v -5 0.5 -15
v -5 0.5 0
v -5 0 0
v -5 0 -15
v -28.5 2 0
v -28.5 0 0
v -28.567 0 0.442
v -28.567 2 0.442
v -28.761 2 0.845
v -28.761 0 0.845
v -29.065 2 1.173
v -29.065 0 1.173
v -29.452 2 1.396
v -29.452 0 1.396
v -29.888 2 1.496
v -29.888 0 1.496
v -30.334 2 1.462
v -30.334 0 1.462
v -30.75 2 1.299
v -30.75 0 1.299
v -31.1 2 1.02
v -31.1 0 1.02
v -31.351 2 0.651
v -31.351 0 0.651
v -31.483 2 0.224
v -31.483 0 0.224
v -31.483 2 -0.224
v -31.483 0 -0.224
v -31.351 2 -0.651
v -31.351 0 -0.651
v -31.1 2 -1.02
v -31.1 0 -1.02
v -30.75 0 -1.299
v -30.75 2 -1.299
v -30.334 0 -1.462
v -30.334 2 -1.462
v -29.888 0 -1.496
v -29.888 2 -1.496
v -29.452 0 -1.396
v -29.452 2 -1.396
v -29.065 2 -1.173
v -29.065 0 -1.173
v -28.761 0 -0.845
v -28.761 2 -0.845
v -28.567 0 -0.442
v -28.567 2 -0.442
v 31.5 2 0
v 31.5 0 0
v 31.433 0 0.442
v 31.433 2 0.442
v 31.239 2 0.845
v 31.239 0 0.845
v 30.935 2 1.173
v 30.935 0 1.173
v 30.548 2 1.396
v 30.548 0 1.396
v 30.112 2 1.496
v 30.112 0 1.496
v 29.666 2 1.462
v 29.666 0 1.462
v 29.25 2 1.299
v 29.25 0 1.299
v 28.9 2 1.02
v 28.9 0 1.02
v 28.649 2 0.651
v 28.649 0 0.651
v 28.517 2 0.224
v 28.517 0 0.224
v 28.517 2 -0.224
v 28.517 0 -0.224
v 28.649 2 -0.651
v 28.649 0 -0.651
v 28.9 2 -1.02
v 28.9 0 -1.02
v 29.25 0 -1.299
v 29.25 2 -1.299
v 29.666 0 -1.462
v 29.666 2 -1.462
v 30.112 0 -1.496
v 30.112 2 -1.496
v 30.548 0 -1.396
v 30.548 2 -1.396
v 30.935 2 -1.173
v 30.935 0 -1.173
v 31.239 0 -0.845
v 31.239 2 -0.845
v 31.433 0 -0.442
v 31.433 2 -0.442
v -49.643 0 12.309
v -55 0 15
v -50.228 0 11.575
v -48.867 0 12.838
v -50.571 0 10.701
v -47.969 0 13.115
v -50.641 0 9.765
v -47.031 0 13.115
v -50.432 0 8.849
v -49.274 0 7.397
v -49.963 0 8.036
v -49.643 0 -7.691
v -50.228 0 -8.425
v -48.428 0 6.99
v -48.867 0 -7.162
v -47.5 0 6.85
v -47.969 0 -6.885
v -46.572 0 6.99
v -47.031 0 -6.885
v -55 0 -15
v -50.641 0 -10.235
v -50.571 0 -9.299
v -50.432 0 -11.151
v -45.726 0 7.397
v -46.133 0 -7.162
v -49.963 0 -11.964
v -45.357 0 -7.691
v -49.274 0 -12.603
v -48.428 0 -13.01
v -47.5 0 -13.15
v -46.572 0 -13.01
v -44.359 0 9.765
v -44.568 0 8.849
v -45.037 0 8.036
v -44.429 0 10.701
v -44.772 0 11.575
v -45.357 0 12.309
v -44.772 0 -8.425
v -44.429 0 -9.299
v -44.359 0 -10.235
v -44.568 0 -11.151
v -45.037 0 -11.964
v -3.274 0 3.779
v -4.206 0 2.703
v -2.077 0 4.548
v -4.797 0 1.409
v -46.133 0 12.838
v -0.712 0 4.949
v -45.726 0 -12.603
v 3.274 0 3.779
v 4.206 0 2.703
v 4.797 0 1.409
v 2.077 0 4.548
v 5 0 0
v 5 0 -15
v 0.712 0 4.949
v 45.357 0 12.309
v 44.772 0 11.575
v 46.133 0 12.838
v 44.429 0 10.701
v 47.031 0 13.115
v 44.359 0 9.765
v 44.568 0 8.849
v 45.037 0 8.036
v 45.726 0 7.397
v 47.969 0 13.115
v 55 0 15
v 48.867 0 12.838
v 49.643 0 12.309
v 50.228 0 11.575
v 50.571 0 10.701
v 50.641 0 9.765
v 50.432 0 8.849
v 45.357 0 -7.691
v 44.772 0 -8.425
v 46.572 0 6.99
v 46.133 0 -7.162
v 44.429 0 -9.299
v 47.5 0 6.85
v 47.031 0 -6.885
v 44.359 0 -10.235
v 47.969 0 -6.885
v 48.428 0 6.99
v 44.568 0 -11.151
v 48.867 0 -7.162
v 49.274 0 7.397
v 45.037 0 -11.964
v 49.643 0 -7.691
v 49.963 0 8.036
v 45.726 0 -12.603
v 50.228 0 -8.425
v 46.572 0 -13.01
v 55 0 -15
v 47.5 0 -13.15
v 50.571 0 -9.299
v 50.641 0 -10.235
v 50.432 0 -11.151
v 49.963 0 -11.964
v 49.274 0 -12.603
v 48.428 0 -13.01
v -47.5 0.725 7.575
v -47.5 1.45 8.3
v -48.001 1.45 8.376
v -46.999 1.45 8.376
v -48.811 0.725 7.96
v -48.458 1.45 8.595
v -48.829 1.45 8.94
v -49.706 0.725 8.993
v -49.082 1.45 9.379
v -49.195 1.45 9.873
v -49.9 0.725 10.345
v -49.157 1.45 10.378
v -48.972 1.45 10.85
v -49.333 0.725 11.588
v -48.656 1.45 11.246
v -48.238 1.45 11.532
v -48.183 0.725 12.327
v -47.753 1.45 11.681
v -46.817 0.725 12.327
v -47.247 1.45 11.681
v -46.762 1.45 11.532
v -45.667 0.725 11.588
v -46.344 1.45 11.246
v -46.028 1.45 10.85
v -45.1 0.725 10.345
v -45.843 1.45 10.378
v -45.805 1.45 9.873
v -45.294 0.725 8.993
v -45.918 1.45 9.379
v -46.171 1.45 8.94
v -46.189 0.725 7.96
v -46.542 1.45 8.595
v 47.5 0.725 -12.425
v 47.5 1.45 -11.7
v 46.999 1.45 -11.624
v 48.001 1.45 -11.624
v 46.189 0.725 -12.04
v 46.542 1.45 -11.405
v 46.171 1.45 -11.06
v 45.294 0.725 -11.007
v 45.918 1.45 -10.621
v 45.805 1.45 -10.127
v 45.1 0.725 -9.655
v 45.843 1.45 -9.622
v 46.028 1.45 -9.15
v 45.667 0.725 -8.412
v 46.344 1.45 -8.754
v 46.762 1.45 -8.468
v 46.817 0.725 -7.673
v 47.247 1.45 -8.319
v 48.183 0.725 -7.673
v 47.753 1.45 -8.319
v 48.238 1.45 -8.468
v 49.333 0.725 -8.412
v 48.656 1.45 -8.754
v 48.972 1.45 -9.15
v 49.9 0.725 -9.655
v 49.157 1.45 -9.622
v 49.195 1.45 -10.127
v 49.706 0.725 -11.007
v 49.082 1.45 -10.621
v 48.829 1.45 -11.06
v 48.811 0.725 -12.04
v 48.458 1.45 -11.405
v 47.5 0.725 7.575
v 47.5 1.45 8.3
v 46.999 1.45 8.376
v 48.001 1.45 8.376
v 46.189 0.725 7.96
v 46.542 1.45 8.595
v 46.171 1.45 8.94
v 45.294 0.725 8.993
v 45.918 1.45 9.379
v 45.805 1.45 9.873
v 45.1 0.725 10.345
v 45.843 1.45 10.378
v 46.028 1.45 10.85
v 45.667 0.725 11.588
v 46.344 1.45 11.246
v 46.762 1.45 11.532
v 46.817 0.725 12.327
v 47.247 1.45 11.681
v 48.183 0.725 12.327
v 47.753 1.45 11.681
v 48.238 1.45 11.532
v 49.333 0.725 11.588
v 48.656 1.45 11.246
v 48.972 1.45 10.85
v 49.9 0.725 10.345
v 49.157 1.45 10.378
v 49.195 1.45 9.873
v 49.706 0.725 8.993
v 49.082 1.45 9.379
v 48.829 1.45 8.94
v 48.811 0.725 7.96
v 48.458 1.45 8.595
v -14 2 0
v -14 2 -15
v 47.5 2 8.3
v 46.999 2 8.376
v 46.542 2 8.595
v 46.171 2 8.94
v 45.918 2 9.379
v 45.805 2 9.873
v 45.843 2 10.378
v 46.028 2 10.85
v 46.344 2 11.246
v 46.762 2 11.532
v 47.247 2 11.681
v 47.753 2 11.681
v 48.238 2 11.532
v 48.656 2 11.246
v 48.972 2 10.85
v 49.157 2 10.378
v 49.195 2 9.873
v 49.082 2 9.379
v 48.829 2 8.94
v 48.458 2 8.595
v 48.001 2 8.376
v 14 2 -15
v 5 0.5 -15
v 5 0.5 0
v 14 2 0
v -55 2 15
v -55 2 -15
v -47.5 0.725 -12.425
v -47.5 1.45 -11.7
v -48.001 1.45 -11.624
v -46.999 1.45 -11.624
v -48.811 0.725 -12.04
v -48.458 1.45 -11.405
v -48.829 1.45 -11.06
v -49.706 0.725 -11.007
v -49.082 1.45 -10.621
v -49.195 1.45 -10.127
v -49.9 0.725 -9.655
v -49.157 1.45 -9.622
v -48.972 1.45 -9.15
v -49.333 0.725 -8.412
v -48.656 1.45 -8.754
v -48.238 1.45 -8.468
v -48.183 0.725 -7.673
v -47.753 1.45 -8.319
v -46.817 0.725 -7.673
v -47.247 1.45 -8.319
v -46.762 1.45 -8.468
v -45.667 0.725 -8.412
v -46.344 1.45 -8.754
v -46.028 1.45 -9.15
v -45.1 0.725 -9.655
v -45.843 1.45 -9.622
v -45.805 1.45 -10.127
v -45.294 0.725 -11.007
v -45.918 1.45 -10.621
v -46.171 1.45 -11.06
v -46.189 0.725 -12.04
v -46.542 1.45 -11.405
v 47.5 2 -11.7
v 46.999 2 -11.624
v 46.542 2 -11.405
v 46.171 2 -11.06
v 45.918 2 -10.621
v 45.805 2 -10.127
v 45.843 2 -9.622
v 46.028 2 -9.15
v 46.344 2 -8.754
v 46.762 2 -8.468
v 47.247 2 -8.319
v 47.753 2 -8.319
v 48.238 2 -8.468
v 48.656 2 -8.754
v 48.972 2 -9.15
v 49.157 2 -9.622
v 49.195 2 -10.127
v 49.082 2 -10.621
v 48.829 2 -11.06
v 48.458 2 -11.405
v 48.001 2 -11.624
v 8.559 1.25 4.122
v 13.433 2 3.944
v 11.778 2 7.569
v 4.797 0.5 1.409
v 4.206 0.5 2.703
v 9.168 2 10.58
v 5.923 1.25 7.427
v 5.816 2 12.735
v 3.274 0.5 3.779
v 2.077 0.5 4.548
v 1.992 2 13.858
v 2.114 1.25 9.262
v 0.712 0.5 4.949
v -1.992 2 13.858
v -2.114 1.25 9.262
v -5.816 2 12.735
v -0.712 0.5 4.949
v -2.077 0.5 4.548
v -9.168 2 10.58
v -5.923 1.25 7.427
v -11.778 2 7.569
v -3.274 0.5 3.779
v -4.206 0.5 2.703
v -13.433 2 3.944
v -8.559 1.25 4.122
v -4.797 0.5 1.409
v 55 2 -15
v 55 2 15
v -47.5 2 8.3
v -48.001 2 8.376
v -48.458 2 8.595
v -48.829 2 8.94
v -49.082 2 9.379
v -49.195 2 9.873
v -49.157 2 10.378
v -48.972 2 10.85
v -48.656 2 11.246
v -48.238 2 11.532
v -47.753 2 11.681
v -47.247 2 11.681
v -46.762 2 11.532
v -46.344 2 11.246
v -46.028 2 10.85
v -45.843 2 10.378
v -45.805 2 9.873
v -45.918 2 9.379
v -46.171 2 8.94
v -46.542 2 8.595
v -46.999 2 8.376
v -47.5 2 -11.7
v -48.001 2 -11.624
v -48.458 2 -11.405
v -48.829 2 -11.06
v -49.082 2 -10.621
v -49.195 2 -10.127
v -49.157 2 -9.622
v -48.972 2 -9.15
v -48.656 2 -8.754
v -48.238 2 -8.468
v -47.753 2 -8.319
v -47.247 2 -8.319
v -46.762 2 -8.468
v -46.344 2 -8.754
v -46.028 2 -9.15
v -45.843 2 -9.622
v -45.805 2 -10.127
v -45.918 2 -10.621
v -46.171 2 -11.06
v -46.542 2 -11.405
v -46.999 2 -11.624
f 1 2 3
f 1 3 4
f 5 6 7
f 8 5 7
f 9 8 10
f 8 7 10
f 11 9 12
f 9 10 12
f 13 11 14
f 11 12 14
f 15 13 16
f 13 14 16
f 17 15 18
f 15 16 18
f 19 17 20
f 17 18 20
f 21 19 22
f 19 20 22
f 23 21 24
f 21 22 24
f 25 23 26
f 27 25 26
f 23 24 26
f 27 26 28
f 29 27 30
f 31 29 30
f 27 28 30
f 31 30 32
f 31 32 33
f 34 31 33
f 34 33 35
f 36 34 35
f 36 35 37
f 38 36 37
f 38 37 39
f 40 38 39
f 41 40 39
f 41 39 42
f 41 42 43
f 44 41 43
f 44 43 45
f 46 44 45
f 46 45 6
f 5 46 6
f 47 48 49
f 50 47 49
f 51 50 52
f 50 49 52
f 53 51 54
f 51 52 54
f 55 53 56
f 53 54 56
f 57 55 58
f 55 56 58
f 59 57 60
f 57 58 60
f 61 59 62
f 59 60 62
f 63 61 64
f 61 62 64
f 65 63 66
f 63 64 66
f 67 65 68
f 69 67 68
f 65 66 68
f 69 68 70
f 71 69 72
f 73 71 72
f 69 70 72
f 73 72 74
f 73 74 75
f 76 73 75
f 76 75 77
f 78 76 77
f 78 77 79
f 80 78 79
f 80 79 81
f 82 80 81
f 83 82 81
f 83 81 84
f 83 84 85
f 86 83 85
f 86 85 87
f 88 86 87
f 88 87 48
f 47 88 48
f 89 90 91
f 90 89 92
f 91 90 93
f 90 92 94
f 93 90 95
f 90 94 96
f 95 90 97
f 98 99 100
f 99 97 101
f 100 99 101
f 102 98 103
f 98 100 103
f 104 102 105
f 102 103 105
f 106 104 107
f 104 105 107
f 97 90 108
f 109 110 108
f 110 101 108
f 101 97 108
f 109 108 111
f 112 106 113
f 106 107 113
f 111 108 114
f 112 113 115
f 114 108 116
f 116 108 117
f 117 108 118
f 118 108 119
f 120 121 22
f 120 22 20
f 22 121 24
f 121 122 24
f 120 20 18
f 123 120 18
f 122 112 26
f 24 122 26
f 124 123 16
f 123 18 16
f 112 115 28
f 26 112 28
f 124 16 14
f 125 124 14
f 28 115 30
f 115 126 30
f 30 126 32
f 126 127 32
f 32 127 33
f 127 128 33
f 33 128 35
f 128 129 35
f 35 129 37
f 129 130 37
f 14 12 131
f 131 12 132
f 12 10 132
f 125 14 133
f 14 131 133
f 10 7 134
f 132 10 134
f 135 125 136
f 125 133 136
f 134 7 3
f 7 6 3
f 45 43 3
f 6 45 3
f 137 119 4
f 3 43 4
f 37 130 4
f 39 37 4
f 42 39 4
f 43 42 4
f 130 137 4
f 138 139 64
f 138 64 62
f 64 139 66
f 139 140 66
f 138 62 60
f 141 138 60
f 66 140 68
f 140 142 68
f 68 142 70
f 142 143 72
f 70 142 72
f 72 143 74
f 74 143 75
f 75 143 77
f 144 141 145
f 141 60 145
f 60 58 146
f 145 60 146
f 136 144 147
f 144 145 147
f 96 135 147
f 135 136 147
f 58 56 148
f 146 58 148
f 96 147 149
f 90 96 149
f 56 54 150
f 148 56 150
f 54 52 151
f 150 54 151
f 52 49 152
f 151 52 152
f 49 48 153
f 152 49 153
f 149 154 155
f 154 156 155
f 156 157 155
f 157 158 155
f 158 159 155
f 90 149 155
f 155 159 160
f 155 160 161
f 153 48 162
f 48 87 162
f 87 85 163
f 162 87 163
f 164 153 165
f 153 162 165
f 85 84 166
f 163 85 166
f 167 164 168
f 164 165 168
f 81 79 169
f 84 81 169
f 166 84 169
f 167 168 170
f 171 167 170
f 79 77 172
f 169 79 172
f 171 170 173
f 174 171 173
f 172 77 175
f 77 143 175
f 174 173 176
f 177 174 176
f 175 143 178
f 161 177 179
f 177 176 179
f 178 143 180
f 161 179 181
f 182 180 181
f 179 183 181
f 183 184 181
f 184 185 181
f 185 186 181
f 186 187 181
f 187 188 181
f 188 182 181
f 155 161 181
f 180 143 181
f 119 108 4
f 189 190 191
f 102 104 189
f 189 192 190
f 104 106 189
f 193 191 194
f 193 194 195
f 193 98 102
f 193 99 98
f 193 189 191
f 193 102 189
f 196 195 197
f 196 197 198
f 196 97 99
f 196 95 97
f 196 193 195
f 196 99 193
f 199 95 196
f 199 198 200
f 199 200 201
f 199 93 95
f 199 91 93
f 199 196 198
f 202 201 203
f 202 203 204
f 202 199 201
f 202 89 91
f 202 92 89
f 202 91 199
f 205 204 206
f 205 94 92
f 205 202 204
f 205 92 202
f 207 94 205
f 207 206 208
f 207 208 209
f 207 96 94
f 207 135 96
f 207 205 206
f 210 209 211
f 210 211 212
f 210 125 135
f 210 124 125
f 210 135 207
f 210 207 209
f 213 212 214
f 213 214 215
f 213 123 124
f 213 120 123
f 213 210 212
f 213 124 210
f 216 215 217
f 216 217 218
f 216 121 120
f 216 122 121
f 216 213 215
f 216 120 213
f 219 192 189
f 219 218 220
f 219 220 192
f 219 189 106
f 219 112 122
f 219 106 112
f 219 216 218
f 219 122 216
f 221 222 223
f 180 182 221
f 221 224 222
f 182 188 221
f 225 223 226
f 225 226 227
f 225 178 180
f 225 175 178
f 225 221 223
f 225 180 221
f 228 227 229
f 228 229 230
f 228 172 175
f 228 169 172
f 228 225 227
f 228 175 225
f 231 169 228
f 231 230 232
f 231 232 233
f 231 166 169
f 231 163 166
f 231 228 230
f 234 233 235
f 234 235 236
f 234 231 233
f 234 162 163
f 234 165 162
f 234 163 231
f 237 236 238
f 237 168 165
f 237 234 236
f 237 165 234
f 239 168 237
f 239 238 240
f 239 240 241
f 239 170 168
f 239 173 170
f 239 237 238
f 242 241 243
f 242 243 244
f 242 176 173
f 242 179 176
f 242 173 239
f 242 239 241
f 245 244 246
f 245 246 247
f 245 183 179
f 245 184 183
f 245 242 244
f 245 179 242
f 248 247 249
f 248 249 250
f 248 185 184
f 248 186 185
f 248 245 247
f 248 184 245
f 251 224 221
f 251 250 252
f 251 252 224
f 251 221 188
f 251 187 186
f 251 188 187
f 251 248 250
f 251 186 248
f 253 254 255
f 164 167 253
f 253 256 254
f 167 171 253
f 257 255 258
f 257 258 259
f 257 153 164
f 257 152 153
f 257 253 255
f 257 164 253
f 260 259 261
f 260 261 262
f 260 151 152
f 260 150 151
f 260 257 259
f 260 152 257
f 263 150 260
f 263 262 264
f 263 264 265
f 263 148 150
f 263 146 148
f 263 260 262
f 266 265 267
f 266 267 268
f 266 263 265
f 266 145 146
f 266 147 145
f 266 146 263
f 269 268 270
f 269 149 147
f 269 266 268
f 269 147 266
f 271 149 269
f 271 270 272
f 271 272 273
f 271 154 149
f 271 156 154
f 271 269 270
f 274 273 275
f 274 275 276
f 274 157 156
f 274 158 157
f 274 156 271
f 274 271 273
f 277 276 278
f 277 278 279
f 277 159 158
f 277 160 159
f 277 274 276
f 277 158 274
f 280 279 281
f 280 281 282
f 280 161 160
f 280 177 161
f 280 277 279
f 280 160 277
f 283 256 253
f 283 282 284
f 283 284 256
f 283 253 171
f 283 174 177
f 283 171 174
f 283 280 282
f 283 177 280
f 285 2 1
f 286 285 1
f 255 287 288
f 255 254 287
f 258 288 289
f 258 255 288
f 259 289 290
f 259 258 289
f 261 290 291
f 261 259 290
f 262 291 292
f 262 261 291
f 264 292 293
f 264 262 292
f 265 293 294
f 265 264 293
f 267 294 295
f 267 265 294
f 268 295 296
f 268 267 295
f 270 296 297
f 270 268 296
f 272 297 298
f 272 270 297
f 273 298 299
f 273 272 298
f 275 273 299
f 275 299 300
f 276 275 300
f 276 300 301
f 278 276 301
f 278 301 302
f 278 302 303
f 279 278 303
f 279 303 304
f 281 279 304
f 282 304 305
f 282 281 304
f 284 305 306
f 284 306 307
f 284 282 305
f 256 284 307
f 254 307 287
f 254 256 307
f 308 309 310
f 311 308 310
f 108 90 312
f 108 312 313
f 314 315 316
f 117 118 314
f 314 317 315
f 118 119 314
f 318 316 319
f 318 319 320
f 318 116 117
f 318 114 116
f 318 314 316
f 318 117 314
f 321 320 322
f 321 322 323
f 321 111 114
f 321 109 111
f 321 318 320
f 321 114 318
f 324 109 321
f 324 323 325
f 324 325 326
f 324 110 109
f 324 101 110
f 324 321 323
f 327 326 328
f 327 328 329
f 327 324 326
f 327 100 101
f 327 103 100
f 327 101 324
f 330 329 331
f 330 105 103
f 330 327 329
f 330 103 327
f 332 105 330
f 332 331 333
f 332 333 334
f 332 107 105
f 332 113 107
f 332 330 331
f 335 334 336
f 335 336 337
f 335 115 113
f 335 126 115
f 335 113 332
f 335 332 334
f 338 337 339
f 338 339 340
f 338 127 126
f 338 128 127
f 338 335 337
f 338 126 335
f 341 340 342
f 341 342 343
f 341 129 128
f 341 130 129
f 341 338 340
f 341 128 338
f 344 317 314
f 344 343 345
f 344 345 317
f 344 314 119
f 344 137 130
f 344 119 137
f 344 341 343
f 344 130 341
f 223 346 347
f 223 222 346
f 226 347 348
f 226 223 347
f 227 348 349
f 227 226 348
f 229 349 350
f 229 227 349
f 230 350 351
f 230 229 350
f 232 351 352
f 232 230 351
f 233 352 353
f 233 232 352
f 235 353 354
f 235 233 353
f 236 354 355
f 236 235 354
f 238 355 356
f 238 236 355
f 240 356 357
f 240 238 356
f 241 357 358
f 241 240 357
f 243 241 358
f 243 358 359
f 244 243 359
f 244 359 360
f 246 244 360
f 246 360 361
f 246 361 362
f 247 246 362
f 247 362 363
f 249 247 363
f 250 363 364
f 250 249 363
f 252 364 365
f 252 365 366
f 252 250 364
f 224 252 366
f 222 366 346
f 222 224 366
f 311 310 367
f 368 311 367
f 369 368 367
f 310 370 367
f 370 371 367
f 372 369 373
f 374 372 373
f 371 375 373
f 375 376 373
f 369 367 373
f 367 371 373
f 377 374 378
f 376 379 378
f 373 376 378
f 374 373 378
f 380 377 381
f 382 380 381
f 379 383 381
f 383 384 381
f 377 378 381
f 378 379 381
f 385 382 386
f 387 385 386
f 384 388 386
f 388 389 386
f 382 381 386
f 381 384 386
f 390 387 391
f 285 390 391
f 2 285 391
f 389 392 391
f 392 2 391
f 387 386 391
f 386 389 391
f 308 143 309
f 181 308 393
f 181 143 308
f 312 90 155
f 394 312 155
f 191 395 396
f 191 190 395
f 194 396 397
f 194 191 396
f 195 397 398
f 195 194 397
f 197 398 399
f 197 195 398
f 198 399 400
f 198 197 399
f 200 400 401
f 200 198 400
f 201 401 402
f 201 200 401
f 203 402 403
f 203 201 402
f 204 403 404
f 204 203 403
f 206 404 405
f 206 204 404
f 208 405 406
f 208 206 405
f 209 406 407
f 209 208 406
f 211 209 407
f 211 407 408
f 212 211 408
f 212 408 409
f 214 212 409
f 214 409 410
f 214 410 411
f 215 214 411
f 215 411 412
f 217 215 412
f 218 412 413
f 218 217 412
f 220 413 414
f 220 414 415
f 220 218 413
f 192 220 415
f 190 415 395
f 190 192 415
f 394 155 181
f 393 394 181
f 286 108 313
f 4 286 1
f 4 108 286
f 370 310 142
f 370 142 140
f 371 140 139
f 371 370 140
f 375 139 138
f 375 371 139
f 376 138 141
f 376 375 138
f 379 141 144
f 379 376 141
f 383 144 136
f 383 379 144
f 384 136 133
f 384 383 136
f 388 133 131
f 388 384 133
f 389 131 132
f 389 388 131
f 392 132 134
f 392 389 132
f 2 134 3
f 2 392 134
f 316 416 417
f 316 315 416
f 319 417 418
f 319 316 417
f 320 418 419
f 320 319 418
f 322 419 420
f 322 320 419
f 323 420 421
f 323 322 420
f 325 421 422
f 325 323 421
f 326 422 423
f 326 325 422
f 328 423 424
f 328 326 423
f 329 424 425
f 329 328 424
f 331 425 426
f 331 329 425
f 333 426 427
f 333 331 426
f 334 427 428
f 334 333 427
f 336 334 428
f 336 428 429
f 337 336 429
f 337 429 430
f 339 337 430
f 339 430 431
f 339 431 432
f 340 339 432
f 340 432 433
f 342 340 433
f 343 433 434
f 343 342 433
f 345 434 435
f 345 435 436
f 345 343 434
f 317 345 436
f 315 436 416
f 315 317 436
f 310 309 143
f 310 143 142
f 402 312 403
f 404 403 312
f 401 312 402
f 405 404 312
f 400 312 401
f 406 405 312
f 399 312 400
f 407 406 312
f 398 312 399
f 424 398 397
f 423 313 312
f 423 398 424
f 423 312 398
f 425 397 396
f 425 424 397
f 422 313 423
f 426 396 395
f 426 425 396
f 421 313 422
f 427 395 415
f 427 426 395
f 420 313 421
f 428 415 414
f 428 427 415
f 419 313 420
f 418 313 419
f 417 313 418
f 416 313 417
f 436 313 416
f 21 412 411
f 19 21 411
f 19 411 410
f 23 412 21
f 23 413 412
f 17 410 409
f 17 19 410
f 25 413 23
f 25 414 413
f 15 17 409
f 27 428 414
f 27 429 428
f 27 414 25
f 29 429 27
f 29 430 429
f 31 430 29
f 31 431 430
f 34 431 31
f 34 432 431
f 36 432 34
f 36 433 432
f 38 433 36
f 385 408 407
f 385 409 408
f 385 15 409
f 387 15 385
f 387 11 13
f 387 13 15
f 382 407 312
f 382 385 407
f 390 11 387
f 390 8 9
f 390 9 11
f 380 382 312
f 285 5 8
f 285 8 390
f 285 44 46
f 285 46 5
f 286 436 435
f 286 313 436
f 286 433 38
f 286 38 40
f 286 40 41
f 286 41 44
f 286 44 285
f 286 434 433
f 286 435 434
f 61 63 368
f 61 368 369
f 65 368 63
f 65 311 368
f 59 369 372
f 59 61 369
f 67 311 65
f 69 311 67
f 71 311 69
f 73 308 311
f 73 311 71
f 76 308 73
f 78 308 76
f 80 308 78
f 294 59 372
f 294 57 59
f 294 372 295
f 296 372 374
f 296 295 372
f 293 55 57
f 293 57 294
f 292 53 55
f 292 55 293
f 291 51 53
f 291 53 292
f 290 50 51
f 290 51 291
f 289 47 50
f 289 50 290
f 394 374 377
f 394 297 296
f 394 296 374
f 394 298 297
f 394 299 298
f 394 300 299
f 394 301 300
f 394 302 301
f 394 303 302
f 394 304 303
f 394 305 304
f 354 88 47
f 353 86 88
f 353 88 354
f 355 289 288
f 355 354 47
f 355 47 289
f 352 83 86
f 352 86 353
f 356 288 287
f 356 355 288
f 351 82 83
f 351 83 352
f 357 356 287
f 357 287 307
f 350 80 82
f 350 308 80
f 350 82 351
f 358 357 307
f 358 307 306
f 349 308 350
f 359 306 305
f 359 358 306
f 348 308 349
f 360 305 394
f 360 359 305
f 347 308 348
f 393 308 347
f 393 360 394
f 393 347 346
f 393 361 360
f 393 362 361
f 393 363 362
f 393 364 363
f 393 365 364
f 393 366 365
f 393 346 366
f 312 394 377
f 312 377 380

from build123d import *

# Parameters (mm, degrees)
SKETCH1_W                                    = 110
SKETCH1_H                                    = 30
EXTRUDE1_DEPTH                               = 2
CUT_EXTRUDE1_DEPTH                           = 3
CHAMFER1_SIZE                                = 9
CHAMFER1_SIZE2                               = 1.5
CSK_FOR_M3_COUNTERSUNK_RAISED_HEAD_S_2_COUNT = 2
CSK_FOR_M3_COUNTERSUNK_RAISED_HEAD_S_2_PITCH = 95
CSK_FOR_M3_COUNTERSUNK_RAISED_HEAD_S_3_COUNT = 2
CSK_FOR_M3_COUNTERSUNK_RAISED_HEAD_S_3_PITCH = 97.082439195
CSK_FOR_M3_COUNTERSUNK_RAISED_HEAD_S_4_COUNT = 2
CSK_FOR_M3_COUNTERSUNK_RAISED_HEAD_S_4_PITCH = 20
M3_TAPPED_HOLE1_D                            = 3


with BuildPart() as part:
    # Sketch1 → Extrude1 (new body)
    with BuildSketch(Plane(origin=(0, 0, 0), x_dir=(1, 0, 0), z_dir=(0, 1, 0))):
        Rectangle(SKETCH1_W, SKETCH1_H)
    extrude(amount=EXTRUDE1_DEPTH)

    # Sketch2 → Cut-Extrude1 (cut, through all)
    with BuildSketch(Plane(origin=(0, 2, 0), x_dir=(-1, 0, 0), z_dir=(0, 1, 0))):
        with BuildLine():
            Line((5, 0), (5, -15))
            Line((5, -15), (-5, -15))
            Line((-5, -15), (-5, 0))
            ThreePointArc((-5, 0), (0, 5), (5, 0))
        make_face()
    extrude(amount=-CUT_EXTRUDE1_DEPTH, mode=Mode.SUBTRACT)

    # Chamfer1
    chamfer1_edges = [part.edges().sort_by_distance(p)[0] for p in [
        (0, 2, 5),
        (5, 2, -7.5),
        (-5, 2, -7.5),
    ]]
    chamfer1_side = [part.faces().sort_by_distance(p)[0] for p in [
        (-53.859824575, 2, 0),
    ]]
    chamfer(chamfer1_edges, length=CHAMFER1_SIZE, length2=CHAMFER1_SIZE2, reference=chamfer1_side[0])

    # Sketch8 → CSK for M3 Countersunk Raised Head Screw1 (revolve, cut)
    with BuildSketch(Plane(origin=(47.5, 0, -10), x_dir=(0, 0, -1), z_dir=(1, 0, 0))):
        Polygon((0, 0), (0, 2), (1.7, 2), (1.7, 1.45), (3.15, 0), align=None)
    csk_for_m3_countersunk_raised_head_screw = revolve(axis=Axis((47.5, -6.35, -10), (0, 1, 0)), mode=Mode.SUBTRACT)

    # CSK for M3 Countersunk Raised Head S 2: CSK for M3 Countersunk Raised Head Screw1 ×2
    with Locations(*[(-i * CSK_FOR_M3_COUNTERSUNK_RAISED_HEAD_S_2_PITCH, 0, 0) for i in range(1, CSK_FOR_M3_COUNTERSUNK_RAISED_HEAD_S_2_COUNT)]):
        add(csk_for_m3_countersunk_raised_head_screw, mode=Mode.SUBTRACT)

    # CSK for M3 Countersunk Raised Head S 3: CSK for M3 Countersunk Raised Head Screw1 ×2
    with Locations(*[Vector(-0.978549785, 0, 0.206010481) * (i * CSK_FOR_M3_COUNTERSUNK_RAISED_HEAD_S_3_PITCH) for i in range(1, CSK_FOR_M3_COUNTERSUNK_RAISED_HEAD_S_3_COUNT)]):
        add(csk_for_m3_countersunk_raised_head_screw, mode=Mode.SUBTRACT)

    # CSK for M3 Countersunk Raised Head S 4: CSK for M3 Countersunk Raised Head Screw1 ×2
    with Locations(*[(0, 0, i * CSK_FOR_M3_COUNTERSUNK_RAISED_HEAD_S_4_PITCH) for i in range(1, CSK_FOR_M3_COUNTERSUNK_RAISED_HEAD_S_4_COUNT)]):
        add(csk_for_m3_countersunk_raised_head_screw, mode=Mode.SUBTRACT)

    # M3 Tapped Hole1 (through all)
    with Locations(Plane(origin=(0, 2, 0), x_dir=(-1, 0, 0), z_dir=(0, 1, 0))):
        with Locations((-30, 0), (30, 0)):
            Hole(M3_TAPPED_HOLE1_D / 2)


solid = part.part
